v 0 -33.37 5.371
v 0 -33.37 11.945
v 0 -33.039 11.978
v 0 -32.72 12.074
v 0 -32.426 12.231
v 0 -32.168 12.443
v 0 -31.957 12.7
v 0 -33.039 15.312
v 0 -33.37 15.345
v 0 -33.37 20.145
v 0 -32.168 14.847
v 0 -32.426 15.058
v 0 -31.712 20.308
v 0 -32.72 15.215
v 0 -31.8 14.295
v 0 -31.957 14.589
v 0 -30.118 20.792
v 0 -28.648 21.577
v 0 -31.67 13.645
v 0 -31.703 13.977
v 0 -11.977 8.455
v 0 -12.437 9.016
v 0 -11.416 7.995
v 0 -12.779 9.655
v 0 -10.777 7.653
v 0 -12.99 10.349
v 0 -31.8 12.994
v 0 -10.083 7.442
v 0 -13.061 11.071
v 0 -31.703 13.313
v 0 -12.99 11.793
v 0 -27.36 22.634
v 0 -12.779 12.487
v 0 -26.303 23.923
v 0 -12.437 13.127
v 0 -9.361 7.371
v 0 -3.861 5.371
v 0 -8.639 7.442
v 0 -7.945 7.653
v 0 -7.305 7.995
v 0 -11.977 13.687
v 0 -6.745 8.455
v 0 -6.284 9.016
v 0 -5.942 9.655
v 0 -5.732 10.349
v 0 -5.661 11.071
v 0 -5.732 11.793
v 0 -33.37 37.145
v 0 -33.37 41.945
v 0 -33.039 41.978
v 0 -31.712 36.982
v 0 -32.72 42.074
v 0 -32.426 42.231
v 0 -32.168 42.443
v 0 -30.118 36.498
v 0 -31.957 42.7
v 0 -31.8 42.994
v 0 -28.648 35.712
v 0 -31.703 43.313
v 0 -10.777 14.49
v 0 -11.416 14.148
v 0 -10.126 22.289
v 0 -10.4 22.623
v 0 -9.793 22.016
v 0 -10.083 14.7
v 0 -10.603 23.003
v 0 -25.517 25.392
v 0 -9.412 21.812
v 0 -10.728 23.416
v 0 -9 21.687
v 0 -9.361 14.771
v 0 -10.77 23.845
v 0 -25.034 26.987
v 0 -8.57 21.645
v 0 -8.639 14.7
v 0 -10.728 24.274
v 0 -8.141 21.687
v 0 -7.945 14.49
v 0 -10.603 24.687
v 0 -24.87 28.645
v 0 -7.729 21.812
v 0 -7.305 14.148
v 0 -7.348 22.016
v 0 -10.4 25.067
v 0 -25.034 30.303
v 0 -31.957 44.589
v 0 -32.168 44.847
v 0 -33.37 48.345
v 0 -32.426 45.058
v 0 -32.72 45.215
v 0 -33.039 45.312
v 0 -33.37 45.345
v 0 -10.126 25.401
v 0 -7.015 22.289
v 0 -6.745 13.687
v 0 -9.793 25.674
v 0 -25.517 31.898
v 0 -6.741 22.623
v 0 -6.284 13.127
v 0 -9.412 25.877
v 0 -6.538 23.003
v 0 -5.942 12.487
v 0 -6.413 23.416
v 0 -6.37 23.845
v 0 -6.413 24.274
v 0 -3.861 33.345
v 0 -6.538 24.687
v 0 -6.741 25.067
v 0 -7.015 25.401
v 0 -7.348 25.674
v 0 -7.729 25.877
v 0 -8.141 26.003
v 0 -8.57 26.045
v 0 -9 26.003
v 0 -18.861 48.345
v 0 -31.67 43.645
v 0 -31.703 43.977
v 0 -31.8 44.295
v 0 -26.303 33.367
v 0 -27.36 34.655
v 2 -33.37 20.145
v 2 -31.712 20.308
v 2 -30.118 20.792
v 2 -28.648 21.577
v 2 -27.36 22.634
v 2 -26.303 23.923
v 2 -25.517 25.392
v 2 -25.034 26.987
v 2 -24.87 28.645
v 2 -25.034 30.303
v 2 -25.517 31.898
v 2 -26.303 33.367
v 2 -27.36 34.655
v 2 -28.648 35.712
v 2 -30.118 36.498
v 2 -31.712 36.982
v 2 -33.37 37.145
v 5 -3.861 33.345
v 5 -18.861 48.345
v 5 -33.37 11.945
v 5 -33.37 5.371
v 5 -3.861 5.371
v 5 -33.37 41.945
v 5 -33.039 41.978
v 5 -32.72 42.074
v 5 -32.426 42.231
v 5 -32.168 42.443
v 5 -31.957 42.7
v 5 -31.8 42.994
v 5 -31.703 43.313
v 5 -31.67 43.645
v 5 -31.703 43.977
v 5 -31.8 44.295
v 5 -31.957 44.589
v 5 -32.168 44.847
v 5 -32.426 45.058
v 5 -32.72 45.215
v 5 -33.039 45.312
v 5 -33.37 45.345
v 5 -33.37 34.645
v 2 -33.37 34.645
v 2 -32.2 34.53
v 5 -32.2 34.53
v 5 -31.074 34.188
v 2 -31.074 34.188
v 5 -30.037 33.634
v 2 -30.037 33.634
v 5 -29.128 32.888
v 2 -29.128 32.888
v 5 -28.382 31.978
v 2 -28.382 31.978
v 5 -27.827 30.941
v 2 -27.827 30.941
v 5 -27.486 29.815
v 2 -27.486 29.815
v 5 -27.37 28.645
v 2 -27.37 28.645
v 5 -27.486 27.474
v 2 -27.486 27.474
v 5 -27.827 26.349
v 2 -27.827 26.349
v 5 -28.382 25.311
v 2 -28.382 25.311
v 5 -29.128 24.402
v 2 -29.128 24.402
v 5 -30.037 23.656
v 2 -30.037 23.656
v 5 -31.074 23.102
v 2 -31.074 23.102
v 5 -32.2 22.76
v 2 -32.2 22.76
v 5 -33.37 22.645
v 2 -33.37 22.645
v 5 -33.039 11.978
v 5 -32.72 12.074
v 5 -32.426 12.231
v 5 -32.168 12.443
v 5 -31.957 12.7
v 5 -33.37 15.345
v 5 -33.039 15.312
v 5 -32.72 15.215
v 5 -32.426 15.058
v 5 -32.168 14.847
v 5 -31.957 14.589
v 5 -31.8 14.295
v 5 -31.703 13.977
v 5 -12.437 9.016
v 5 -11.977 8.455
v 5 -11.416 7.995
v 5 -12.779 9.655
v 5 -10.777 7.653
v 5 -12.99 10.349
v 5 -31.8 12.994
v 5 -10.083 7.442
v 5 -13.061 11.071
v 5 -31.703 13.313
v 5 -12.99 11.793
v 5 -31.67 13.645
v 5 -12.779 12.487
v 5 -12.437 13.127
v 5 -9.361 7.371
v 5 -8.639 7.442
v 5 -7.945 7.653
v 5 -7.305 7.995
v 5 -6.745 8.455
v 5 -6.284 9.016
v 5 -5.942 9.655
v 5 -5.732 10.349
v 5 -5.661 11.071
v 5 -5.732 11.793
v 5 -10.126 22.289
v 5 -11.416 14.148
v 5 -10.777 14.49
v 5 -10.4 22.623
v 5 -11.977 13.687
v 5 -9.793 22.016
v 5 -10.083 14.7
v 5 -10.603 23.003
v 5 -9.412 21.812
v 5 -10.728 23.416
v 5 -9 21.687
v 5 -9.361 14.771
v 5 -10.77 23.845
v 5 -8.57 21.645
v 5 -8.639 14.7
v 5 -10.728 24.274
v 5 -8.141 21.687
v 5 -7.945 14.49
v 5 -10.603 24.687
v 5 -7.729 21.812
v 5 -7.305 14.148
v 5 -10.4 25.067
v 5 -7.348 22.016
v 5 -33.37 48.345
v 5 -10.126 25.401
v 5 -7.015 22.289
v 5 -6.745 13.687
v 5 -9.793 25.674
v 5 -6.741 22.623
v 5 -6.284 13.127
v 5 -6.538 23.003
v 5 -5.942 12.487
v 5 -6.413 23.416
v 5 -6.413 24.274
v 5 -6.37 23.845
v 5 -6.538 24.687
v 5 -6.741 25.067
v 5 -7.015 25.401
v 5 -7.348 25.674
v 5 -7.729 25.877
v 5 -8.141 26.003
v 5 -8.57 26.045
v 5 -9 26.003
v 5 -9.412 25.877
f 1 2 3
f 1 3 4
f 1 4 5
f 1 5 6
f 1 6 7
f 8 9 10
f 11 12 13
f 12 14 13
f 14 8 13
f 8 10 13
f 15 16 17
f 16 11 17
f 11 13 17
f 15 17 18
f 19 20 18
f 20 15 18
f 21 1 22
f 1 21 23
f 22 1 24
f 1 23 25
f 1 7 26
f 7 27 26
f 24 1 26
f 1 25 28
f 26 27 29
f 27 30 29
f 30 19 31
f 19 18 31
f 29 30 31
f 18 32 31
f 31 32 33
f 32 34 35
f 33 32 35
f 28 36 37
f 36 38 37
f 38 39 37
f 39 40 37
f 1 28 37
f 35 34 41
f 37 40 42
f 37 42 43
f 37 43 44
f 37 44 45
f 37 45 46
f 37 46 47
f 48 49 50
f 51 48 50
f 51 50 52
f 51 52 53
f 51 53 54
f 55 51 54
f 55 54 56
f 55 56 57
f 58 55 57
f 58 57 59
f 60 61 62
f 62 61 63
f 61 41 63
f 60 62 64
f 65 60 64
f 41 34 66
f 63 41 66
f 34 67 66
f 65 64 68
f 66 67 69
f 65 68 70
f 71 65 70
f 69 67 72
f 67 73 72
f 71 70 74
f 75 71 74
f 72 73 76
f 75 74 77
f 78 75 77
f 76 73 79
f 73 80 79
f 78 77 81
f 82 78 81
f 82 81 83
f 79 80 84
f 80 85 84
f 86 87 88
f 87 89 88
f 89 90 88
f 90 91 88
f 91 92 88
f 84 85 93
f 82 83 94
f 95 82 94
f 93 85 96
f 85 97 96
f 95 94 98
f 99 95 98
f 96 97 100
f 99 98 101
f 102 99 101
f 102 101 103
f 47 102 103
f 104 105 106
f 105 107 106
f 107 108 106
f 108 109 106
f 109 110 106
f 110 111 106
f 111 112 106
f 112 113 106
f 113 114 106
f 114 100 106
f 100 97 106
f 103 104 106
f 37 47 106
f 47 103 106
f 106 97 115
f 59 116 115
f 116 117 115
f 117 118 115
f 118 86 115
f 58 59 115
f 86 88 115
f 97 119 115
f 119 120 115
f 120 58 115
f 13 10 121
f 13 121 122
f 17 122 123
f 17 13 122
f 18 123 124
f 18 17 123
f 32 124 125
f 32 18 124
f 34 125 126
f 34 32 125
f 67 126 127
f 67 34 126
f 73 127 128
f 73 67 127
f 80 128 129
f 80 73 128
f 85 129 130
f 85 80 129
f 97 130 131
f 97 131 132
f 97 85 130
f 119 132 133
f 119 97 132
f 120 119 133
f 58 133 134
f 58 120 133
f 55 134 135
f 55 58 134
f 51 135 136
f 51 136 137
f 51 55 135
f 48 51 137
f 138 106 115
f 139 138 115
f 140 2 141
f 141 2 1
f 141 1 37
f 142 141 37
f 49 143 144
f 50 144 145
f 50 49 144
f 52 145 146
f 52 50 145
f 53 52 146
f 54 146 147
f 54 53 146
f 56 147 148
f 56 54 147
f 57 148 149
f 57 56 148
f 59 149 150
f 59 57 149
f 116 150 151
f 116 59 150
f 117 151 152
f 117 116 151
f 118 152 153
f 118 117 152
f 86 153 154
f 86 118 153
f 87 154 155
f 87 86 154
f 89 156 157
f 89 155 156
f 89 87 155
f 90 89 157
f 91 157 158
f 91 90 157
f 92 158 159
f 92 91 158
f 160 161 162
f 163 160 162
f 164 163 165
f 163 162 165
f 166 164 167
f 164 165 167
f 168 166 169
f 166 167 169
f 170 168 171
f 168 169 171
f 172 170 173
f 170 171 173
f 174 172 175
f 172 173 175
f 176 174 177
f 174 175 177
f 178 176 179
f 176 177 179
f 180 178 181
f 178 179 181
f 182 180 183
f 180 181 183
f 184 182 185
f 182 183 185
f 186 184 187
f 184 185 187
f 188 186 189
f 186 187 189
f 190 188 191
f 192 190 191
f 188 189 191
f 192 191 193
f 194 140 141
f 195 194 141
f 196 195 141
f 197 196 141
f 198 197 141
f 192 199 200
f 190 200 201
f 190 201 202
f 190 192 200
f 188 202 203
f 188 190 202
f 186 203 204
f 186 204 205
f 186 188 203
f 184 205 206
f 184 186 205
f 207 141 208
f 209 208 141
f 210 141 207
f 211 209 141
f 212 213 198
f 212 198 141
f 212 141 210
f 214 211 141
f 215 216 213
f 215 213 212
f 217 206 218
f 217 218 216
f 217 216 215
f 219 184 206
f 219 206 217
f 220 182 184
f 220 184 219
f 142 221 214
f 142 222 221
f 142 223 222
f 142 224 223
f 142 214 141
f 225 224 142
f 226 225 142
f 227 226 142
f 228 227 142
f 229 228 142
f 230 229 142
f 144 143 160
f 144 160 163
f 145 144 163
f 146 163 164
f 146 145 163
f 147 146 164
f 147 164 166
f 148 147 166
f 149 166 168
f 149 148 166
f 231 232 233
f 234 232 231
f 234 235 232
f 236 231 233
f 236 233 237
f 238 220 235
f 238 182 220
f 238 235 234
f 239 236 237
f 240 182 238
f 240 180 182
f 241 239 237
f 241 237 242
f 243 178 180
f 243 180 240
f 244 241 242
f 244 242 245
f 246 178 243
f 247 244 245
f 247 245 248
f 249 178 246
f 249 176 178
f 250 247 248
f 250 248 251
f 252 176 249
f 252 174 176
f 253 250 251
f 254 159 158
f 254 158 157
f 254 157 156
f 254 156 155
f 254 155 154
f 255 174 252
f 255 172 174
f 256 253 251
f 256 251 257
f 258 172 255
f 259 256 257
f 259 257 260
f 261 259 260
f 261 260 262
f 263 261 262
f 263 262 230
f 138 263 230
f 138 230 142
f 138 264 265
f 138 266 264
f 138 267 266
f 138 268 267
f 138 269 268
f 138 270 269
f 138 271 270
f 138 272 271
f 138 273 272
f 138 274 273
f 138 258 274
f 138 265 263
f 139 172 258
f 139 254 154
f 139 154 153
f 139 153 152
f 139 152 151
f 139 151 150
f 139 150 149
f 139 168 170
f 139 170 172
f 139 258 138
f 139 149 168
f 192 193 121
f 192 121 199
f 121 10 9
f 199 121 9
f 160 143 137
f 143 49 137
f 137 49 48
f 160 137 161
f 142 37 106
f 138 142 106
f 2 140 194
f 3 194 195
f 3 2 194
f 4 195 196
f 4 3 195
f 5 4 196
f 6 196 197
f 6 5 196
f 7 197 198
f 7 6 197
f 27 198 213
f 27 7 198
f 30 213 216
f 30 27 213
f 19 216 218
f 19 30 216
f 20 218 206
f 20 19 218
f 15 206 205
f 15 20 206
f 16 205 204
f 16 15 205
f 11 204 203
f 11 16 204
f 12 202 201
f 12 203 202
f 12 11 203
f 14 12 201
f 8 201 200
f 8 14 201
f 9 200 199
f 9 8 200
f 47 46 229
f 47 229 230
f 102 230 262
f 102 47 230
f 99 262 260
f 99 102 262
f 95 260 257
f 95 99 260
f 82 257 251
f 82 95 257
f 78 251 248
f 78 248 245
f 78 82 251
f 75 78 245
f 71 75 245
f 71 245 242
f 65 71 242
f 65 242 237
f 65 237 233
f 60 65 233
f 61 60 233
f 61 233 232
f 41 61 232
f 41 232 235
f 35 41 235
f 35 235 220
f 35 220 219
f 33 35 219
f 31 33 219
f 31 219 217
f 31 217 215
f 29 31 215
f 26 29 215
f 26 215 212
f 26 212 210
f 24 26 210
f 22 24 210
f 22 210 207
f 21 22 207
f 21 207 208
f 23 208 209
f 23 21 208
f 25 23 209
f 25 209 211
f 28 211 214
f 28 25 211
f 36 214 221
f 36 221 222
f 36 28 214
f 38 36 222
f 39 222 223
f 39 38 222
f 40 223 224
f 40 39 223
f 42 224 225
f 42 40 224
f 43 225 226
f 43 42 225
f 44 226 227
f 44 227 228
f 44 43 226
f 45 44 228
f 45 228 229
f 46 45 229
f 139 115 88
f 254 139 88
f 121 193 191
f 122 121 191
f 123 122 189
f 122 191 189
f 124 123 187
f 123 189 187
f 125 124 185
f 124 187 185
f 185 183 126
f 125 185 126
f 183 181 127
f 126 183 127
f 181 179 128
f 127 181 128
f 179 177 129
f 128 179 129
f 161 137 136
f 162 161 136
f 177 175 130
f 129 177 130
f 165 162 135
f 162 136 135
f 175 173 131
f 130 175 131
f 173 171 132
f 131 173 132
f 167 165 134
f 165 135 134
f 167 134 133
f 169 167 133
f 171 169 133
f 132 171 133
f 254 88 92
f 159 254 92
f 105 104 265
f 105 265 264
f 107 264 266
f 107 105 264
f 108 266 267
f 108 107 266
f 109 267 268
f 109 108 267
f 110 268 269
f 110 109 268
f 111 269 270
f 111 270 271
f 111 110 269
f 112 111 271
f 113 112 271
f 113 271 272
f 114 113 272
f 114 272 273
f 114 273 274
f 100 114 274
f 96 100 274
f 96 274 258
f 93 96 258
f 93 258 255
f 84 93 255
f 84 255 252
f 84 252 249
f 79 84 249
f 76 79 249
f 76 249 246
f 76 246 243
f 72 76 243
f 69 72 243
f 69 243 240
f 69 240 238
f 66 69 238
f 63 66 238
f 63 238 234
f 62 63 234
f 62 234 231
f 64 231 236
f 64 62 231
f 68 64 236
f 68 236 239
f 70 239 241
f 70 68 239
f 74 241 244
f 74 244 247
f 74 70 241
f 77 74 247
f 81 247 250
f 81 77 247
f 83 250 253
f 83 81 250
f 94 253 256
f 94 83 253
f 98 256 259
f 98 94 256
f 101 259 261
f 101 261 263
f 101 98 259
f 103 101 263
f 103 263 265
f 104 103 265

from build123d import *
from build123d import SkipClean  # not in build123d's __all__

# Parameters (mm, degrees)
F0_R     = 3.7
F0_R_2   = 2.2
F1_DEPTH = 5
F2_DEPTH = 3
F3_DEPTH = 5.001
F4_DEPTH = 2
F5_DEPTH = 2


# Not quite as in the source:
# - after a boolean that leaves OpenCascade's solid faulty, fix() repairs it
# - a feature names something its author has since deleted; it is built from what else it names


with BuildPart() as f1:
    # F0 (on Right) → F1 (new body)
    with BuildSketch(Plane.YZ):
        with BuildLine():
            Line((-33.3704365752, 11.9448962937), (-33.3704365752, 5.3711892086))
            Line((-33.3704365752, 5.3711892086), (-3.8608338702, 5.3711892086))
            Line((-3.8608338702, 5.3711892086), (-3.8608338702, 33.3448962937))
            Line((-3.8608338702, 33.3448962937), (-18.8608338702, 48.3448962937))
            Line((-18.8608338702, 48.3448962937), (-33.3704365752, 48.3448962937))
            Line((-33.3704365752, 48.3448962937), (-33.3704365752, 45.3448962937))
            ThreePointArc((-33.3704365752, 45.3448962937), (-31.6704365752, 43.6448962937), (-33.3704365752, 41.9448962937))
            Line((-33.3704365752, 41.9448962937), (-33.3704365752, 37.1448962937))
            ThreePointArc((-33.3704365752, 37.1448962937), (-24.8704365752, 28.6448962937), (-33.3704365752, 20.1448962937))
            Line((-33.3704365752, 20.1448962937), (-33.3704365752, 15.3448962937))
            ThreePointArc((-33.3704365752, 15.3448962937), (-31.6704365752, 13.6448962937), (-33.3704365752, 11.9448962937))
        make_face()
        with Locations((-9.3608338702, 11.0711892086)):
            Circle(F0_R, mode=Mode.SUBTRACT)
        with Locations((-8.5704365752, 23.8448962937)):
            Circle(F0_R_2, mode=Mode.SUBTRACT)
    extrude(amount=F1_DEPTH)

    # F0 (on Right) → F2 (join)
    with BuildSketch(Plane.YZ):
        with BuildLine():
            Line((-33.3704365752, 11.9448962937), (-33.3704365752, 5.3711892086))
            Line((-33.3704365752, 5.3711892086), (-3.8608338702, 5.3711892086))
            Line((-3.8608338702, 5.3711892086), (-3.8608338702, 33.3448962937))
            Line((-3.8608338702, 33.3448962937), (-18.8608338702, 48.3448962937))
            Line((-18.8608338702, 48.3448962937), (-33.3704365752, 48.3448962937))
            Line((-33.3704365752, 48.3448962937), (-33.3704365752, 45.3448962937))
            ThreePointArc((-33.3704365752, 45.3448962937), (-31.6704365752, 43.6448962937), (-33.3704365752, 41.9448962937))
            Line((-33.3704365752, 41.9448962937), (-33.3704365752, 37.1448962937))
            ThreePointArc((-33.3704365752, 37.1448962937), (-24.8704365752, 28.6448962937), (-33.3704365752, 20.1448962937))
            Line((-33.3704365752, 20.1448962937), (-33.3704365752, 15.3448962937))
            ThreePointArc((-33.3704365752, 15.3448962937), (-31.6704365752, 13.6448962937), (-33.3704365752, 11.9448962937))
        make_face()
        with Locations((-9.3608338702, 11.0711892086)):
            Circle(F0_R, mode=Mode.SUBTRACT)
        with Locations((-8.5704365752, 23.8448962937)):
            Circle(F0_R_2, mode=Mode.SUBTRACT)
        with BuildLine():
            Line((-33.3704365752, 15.3448962937), (-33.3704365752, 11.9448962937))
            ThreePointArc((-33.3704365752, 11.9448962937), (-31.6704365752, 13.6448962937), (-33.3704365752, 15.3448962937))
        make_face()
        with BuildLine():
            Line((-33.3704365752, 22.6448962937), (-33.3704365752, 20.1448962937))
            ThreePointArc((-33.3704365752, 20.1448962937), (-24.8704365752, 28.6448962937), (-33.3704365752, 37.1448962937))
            Line((-33.3704365752, 37.1448962937), (-33.3704365752, 34.6448962937))
            ThreePointArc((-33.3704365752, 34.6448962937), (-27.3704365752, 28.6448962937), (-33.3704365752, 22.6448962937))
        make_face()
        with BuildLine():
            Line((-33.3704365752, 34.6448962937), (-33.3704365752, 22.6448962937))
            ThreePointArc((-33.3704365752, 22.6448962937), (-27.3704365752, 28.6448962937), (-33.3704365752, 34.6448962937))
        make_face()
        with BuildLine():
            ThreePointArc((-33.3704365752, 41.9448962937), (-31.6704365752, 43.6448962937), (-33.3704365752, 45.3448962937))
            Line((-33.3704365752, 45.3448962937), (-33.3704365752, 41.9448962937))
        make_face()
    extrude(amount=F2_DEPTH)

    # F0 (on Right) → F3 (cut, through all)
    with BuildSketch(Plane.YZ):
        with BuildLine():
            Line((-33.3704365752, 34.6448962937), (-33.3704365752, 22.6448962937))
            ThreePointArc((-33.3704365752, 22.6448962937), (-27.3704365752, 28.6448962937), (-33.3704365752, 34.6448962937))
        make_face()
        with BuildLine():
            ThreePointArc((-33.3704365752, 41.9448962937), (-31.6704365752, 43.6448962937), (-33.3704365752, 45.3448962937))
            Line((-33.3704365752, 45.3448962937), (-33.3704365752, 41.9448962937))
        make_face()
        with BuildLine():
            Line((-33.3704365752, 15.3448962937), (-33.3704365752, 11.9448962937))
            ThreePointArc((-33.3704365752, 11.9448962937), (-31.6704365752, 13.6448962937), (-33.3704365752, 15.3448962937))
        make_face()
    with SkipClean():  # cleaning this boolean's faces spoils the solid; the shape is the same uncleaned
        extrude(amount=F3_DEPTH, mode=Mode.SUBTRACT)

    # F4 (add, through all): a face of the model
    f4_faces = [f1.faces().sort_by_distance(p)[0] for p in [
        (3, -25.0605023533, 28.6448962937),
    ]]
    extrude(f4_faces, amount=F4_DEPTH)

    add(f1.part.fix(), mode=Mode.REPLACE)

    # F0 (on Right) → F5 (cut)
    with BuildSketch(Plane.YZ):
        with BuildLine():
            Line((-33.3704365752, 22.6448962937), (-33.3704365752, 20.1448962937))
            ThreePointArc((-33.3704365752, 20.1448962937), (-24.8704365752, 28.6448962937), (-33.3704365752, 37.1448962937))
            Line((-33.3704365752, 37.1448962937), (-33.3704365752, 34.6448962937))
            ThreePointArc((-33.3704365752, 34.6448962937), (-27.3704365752, 28.6448962937), (-33.3704365752, 22.6448962937))
        make_face()
    extrude(amount=F5_DEPTH, mode=Mode.SUBTRACT)


solid = f1.part
